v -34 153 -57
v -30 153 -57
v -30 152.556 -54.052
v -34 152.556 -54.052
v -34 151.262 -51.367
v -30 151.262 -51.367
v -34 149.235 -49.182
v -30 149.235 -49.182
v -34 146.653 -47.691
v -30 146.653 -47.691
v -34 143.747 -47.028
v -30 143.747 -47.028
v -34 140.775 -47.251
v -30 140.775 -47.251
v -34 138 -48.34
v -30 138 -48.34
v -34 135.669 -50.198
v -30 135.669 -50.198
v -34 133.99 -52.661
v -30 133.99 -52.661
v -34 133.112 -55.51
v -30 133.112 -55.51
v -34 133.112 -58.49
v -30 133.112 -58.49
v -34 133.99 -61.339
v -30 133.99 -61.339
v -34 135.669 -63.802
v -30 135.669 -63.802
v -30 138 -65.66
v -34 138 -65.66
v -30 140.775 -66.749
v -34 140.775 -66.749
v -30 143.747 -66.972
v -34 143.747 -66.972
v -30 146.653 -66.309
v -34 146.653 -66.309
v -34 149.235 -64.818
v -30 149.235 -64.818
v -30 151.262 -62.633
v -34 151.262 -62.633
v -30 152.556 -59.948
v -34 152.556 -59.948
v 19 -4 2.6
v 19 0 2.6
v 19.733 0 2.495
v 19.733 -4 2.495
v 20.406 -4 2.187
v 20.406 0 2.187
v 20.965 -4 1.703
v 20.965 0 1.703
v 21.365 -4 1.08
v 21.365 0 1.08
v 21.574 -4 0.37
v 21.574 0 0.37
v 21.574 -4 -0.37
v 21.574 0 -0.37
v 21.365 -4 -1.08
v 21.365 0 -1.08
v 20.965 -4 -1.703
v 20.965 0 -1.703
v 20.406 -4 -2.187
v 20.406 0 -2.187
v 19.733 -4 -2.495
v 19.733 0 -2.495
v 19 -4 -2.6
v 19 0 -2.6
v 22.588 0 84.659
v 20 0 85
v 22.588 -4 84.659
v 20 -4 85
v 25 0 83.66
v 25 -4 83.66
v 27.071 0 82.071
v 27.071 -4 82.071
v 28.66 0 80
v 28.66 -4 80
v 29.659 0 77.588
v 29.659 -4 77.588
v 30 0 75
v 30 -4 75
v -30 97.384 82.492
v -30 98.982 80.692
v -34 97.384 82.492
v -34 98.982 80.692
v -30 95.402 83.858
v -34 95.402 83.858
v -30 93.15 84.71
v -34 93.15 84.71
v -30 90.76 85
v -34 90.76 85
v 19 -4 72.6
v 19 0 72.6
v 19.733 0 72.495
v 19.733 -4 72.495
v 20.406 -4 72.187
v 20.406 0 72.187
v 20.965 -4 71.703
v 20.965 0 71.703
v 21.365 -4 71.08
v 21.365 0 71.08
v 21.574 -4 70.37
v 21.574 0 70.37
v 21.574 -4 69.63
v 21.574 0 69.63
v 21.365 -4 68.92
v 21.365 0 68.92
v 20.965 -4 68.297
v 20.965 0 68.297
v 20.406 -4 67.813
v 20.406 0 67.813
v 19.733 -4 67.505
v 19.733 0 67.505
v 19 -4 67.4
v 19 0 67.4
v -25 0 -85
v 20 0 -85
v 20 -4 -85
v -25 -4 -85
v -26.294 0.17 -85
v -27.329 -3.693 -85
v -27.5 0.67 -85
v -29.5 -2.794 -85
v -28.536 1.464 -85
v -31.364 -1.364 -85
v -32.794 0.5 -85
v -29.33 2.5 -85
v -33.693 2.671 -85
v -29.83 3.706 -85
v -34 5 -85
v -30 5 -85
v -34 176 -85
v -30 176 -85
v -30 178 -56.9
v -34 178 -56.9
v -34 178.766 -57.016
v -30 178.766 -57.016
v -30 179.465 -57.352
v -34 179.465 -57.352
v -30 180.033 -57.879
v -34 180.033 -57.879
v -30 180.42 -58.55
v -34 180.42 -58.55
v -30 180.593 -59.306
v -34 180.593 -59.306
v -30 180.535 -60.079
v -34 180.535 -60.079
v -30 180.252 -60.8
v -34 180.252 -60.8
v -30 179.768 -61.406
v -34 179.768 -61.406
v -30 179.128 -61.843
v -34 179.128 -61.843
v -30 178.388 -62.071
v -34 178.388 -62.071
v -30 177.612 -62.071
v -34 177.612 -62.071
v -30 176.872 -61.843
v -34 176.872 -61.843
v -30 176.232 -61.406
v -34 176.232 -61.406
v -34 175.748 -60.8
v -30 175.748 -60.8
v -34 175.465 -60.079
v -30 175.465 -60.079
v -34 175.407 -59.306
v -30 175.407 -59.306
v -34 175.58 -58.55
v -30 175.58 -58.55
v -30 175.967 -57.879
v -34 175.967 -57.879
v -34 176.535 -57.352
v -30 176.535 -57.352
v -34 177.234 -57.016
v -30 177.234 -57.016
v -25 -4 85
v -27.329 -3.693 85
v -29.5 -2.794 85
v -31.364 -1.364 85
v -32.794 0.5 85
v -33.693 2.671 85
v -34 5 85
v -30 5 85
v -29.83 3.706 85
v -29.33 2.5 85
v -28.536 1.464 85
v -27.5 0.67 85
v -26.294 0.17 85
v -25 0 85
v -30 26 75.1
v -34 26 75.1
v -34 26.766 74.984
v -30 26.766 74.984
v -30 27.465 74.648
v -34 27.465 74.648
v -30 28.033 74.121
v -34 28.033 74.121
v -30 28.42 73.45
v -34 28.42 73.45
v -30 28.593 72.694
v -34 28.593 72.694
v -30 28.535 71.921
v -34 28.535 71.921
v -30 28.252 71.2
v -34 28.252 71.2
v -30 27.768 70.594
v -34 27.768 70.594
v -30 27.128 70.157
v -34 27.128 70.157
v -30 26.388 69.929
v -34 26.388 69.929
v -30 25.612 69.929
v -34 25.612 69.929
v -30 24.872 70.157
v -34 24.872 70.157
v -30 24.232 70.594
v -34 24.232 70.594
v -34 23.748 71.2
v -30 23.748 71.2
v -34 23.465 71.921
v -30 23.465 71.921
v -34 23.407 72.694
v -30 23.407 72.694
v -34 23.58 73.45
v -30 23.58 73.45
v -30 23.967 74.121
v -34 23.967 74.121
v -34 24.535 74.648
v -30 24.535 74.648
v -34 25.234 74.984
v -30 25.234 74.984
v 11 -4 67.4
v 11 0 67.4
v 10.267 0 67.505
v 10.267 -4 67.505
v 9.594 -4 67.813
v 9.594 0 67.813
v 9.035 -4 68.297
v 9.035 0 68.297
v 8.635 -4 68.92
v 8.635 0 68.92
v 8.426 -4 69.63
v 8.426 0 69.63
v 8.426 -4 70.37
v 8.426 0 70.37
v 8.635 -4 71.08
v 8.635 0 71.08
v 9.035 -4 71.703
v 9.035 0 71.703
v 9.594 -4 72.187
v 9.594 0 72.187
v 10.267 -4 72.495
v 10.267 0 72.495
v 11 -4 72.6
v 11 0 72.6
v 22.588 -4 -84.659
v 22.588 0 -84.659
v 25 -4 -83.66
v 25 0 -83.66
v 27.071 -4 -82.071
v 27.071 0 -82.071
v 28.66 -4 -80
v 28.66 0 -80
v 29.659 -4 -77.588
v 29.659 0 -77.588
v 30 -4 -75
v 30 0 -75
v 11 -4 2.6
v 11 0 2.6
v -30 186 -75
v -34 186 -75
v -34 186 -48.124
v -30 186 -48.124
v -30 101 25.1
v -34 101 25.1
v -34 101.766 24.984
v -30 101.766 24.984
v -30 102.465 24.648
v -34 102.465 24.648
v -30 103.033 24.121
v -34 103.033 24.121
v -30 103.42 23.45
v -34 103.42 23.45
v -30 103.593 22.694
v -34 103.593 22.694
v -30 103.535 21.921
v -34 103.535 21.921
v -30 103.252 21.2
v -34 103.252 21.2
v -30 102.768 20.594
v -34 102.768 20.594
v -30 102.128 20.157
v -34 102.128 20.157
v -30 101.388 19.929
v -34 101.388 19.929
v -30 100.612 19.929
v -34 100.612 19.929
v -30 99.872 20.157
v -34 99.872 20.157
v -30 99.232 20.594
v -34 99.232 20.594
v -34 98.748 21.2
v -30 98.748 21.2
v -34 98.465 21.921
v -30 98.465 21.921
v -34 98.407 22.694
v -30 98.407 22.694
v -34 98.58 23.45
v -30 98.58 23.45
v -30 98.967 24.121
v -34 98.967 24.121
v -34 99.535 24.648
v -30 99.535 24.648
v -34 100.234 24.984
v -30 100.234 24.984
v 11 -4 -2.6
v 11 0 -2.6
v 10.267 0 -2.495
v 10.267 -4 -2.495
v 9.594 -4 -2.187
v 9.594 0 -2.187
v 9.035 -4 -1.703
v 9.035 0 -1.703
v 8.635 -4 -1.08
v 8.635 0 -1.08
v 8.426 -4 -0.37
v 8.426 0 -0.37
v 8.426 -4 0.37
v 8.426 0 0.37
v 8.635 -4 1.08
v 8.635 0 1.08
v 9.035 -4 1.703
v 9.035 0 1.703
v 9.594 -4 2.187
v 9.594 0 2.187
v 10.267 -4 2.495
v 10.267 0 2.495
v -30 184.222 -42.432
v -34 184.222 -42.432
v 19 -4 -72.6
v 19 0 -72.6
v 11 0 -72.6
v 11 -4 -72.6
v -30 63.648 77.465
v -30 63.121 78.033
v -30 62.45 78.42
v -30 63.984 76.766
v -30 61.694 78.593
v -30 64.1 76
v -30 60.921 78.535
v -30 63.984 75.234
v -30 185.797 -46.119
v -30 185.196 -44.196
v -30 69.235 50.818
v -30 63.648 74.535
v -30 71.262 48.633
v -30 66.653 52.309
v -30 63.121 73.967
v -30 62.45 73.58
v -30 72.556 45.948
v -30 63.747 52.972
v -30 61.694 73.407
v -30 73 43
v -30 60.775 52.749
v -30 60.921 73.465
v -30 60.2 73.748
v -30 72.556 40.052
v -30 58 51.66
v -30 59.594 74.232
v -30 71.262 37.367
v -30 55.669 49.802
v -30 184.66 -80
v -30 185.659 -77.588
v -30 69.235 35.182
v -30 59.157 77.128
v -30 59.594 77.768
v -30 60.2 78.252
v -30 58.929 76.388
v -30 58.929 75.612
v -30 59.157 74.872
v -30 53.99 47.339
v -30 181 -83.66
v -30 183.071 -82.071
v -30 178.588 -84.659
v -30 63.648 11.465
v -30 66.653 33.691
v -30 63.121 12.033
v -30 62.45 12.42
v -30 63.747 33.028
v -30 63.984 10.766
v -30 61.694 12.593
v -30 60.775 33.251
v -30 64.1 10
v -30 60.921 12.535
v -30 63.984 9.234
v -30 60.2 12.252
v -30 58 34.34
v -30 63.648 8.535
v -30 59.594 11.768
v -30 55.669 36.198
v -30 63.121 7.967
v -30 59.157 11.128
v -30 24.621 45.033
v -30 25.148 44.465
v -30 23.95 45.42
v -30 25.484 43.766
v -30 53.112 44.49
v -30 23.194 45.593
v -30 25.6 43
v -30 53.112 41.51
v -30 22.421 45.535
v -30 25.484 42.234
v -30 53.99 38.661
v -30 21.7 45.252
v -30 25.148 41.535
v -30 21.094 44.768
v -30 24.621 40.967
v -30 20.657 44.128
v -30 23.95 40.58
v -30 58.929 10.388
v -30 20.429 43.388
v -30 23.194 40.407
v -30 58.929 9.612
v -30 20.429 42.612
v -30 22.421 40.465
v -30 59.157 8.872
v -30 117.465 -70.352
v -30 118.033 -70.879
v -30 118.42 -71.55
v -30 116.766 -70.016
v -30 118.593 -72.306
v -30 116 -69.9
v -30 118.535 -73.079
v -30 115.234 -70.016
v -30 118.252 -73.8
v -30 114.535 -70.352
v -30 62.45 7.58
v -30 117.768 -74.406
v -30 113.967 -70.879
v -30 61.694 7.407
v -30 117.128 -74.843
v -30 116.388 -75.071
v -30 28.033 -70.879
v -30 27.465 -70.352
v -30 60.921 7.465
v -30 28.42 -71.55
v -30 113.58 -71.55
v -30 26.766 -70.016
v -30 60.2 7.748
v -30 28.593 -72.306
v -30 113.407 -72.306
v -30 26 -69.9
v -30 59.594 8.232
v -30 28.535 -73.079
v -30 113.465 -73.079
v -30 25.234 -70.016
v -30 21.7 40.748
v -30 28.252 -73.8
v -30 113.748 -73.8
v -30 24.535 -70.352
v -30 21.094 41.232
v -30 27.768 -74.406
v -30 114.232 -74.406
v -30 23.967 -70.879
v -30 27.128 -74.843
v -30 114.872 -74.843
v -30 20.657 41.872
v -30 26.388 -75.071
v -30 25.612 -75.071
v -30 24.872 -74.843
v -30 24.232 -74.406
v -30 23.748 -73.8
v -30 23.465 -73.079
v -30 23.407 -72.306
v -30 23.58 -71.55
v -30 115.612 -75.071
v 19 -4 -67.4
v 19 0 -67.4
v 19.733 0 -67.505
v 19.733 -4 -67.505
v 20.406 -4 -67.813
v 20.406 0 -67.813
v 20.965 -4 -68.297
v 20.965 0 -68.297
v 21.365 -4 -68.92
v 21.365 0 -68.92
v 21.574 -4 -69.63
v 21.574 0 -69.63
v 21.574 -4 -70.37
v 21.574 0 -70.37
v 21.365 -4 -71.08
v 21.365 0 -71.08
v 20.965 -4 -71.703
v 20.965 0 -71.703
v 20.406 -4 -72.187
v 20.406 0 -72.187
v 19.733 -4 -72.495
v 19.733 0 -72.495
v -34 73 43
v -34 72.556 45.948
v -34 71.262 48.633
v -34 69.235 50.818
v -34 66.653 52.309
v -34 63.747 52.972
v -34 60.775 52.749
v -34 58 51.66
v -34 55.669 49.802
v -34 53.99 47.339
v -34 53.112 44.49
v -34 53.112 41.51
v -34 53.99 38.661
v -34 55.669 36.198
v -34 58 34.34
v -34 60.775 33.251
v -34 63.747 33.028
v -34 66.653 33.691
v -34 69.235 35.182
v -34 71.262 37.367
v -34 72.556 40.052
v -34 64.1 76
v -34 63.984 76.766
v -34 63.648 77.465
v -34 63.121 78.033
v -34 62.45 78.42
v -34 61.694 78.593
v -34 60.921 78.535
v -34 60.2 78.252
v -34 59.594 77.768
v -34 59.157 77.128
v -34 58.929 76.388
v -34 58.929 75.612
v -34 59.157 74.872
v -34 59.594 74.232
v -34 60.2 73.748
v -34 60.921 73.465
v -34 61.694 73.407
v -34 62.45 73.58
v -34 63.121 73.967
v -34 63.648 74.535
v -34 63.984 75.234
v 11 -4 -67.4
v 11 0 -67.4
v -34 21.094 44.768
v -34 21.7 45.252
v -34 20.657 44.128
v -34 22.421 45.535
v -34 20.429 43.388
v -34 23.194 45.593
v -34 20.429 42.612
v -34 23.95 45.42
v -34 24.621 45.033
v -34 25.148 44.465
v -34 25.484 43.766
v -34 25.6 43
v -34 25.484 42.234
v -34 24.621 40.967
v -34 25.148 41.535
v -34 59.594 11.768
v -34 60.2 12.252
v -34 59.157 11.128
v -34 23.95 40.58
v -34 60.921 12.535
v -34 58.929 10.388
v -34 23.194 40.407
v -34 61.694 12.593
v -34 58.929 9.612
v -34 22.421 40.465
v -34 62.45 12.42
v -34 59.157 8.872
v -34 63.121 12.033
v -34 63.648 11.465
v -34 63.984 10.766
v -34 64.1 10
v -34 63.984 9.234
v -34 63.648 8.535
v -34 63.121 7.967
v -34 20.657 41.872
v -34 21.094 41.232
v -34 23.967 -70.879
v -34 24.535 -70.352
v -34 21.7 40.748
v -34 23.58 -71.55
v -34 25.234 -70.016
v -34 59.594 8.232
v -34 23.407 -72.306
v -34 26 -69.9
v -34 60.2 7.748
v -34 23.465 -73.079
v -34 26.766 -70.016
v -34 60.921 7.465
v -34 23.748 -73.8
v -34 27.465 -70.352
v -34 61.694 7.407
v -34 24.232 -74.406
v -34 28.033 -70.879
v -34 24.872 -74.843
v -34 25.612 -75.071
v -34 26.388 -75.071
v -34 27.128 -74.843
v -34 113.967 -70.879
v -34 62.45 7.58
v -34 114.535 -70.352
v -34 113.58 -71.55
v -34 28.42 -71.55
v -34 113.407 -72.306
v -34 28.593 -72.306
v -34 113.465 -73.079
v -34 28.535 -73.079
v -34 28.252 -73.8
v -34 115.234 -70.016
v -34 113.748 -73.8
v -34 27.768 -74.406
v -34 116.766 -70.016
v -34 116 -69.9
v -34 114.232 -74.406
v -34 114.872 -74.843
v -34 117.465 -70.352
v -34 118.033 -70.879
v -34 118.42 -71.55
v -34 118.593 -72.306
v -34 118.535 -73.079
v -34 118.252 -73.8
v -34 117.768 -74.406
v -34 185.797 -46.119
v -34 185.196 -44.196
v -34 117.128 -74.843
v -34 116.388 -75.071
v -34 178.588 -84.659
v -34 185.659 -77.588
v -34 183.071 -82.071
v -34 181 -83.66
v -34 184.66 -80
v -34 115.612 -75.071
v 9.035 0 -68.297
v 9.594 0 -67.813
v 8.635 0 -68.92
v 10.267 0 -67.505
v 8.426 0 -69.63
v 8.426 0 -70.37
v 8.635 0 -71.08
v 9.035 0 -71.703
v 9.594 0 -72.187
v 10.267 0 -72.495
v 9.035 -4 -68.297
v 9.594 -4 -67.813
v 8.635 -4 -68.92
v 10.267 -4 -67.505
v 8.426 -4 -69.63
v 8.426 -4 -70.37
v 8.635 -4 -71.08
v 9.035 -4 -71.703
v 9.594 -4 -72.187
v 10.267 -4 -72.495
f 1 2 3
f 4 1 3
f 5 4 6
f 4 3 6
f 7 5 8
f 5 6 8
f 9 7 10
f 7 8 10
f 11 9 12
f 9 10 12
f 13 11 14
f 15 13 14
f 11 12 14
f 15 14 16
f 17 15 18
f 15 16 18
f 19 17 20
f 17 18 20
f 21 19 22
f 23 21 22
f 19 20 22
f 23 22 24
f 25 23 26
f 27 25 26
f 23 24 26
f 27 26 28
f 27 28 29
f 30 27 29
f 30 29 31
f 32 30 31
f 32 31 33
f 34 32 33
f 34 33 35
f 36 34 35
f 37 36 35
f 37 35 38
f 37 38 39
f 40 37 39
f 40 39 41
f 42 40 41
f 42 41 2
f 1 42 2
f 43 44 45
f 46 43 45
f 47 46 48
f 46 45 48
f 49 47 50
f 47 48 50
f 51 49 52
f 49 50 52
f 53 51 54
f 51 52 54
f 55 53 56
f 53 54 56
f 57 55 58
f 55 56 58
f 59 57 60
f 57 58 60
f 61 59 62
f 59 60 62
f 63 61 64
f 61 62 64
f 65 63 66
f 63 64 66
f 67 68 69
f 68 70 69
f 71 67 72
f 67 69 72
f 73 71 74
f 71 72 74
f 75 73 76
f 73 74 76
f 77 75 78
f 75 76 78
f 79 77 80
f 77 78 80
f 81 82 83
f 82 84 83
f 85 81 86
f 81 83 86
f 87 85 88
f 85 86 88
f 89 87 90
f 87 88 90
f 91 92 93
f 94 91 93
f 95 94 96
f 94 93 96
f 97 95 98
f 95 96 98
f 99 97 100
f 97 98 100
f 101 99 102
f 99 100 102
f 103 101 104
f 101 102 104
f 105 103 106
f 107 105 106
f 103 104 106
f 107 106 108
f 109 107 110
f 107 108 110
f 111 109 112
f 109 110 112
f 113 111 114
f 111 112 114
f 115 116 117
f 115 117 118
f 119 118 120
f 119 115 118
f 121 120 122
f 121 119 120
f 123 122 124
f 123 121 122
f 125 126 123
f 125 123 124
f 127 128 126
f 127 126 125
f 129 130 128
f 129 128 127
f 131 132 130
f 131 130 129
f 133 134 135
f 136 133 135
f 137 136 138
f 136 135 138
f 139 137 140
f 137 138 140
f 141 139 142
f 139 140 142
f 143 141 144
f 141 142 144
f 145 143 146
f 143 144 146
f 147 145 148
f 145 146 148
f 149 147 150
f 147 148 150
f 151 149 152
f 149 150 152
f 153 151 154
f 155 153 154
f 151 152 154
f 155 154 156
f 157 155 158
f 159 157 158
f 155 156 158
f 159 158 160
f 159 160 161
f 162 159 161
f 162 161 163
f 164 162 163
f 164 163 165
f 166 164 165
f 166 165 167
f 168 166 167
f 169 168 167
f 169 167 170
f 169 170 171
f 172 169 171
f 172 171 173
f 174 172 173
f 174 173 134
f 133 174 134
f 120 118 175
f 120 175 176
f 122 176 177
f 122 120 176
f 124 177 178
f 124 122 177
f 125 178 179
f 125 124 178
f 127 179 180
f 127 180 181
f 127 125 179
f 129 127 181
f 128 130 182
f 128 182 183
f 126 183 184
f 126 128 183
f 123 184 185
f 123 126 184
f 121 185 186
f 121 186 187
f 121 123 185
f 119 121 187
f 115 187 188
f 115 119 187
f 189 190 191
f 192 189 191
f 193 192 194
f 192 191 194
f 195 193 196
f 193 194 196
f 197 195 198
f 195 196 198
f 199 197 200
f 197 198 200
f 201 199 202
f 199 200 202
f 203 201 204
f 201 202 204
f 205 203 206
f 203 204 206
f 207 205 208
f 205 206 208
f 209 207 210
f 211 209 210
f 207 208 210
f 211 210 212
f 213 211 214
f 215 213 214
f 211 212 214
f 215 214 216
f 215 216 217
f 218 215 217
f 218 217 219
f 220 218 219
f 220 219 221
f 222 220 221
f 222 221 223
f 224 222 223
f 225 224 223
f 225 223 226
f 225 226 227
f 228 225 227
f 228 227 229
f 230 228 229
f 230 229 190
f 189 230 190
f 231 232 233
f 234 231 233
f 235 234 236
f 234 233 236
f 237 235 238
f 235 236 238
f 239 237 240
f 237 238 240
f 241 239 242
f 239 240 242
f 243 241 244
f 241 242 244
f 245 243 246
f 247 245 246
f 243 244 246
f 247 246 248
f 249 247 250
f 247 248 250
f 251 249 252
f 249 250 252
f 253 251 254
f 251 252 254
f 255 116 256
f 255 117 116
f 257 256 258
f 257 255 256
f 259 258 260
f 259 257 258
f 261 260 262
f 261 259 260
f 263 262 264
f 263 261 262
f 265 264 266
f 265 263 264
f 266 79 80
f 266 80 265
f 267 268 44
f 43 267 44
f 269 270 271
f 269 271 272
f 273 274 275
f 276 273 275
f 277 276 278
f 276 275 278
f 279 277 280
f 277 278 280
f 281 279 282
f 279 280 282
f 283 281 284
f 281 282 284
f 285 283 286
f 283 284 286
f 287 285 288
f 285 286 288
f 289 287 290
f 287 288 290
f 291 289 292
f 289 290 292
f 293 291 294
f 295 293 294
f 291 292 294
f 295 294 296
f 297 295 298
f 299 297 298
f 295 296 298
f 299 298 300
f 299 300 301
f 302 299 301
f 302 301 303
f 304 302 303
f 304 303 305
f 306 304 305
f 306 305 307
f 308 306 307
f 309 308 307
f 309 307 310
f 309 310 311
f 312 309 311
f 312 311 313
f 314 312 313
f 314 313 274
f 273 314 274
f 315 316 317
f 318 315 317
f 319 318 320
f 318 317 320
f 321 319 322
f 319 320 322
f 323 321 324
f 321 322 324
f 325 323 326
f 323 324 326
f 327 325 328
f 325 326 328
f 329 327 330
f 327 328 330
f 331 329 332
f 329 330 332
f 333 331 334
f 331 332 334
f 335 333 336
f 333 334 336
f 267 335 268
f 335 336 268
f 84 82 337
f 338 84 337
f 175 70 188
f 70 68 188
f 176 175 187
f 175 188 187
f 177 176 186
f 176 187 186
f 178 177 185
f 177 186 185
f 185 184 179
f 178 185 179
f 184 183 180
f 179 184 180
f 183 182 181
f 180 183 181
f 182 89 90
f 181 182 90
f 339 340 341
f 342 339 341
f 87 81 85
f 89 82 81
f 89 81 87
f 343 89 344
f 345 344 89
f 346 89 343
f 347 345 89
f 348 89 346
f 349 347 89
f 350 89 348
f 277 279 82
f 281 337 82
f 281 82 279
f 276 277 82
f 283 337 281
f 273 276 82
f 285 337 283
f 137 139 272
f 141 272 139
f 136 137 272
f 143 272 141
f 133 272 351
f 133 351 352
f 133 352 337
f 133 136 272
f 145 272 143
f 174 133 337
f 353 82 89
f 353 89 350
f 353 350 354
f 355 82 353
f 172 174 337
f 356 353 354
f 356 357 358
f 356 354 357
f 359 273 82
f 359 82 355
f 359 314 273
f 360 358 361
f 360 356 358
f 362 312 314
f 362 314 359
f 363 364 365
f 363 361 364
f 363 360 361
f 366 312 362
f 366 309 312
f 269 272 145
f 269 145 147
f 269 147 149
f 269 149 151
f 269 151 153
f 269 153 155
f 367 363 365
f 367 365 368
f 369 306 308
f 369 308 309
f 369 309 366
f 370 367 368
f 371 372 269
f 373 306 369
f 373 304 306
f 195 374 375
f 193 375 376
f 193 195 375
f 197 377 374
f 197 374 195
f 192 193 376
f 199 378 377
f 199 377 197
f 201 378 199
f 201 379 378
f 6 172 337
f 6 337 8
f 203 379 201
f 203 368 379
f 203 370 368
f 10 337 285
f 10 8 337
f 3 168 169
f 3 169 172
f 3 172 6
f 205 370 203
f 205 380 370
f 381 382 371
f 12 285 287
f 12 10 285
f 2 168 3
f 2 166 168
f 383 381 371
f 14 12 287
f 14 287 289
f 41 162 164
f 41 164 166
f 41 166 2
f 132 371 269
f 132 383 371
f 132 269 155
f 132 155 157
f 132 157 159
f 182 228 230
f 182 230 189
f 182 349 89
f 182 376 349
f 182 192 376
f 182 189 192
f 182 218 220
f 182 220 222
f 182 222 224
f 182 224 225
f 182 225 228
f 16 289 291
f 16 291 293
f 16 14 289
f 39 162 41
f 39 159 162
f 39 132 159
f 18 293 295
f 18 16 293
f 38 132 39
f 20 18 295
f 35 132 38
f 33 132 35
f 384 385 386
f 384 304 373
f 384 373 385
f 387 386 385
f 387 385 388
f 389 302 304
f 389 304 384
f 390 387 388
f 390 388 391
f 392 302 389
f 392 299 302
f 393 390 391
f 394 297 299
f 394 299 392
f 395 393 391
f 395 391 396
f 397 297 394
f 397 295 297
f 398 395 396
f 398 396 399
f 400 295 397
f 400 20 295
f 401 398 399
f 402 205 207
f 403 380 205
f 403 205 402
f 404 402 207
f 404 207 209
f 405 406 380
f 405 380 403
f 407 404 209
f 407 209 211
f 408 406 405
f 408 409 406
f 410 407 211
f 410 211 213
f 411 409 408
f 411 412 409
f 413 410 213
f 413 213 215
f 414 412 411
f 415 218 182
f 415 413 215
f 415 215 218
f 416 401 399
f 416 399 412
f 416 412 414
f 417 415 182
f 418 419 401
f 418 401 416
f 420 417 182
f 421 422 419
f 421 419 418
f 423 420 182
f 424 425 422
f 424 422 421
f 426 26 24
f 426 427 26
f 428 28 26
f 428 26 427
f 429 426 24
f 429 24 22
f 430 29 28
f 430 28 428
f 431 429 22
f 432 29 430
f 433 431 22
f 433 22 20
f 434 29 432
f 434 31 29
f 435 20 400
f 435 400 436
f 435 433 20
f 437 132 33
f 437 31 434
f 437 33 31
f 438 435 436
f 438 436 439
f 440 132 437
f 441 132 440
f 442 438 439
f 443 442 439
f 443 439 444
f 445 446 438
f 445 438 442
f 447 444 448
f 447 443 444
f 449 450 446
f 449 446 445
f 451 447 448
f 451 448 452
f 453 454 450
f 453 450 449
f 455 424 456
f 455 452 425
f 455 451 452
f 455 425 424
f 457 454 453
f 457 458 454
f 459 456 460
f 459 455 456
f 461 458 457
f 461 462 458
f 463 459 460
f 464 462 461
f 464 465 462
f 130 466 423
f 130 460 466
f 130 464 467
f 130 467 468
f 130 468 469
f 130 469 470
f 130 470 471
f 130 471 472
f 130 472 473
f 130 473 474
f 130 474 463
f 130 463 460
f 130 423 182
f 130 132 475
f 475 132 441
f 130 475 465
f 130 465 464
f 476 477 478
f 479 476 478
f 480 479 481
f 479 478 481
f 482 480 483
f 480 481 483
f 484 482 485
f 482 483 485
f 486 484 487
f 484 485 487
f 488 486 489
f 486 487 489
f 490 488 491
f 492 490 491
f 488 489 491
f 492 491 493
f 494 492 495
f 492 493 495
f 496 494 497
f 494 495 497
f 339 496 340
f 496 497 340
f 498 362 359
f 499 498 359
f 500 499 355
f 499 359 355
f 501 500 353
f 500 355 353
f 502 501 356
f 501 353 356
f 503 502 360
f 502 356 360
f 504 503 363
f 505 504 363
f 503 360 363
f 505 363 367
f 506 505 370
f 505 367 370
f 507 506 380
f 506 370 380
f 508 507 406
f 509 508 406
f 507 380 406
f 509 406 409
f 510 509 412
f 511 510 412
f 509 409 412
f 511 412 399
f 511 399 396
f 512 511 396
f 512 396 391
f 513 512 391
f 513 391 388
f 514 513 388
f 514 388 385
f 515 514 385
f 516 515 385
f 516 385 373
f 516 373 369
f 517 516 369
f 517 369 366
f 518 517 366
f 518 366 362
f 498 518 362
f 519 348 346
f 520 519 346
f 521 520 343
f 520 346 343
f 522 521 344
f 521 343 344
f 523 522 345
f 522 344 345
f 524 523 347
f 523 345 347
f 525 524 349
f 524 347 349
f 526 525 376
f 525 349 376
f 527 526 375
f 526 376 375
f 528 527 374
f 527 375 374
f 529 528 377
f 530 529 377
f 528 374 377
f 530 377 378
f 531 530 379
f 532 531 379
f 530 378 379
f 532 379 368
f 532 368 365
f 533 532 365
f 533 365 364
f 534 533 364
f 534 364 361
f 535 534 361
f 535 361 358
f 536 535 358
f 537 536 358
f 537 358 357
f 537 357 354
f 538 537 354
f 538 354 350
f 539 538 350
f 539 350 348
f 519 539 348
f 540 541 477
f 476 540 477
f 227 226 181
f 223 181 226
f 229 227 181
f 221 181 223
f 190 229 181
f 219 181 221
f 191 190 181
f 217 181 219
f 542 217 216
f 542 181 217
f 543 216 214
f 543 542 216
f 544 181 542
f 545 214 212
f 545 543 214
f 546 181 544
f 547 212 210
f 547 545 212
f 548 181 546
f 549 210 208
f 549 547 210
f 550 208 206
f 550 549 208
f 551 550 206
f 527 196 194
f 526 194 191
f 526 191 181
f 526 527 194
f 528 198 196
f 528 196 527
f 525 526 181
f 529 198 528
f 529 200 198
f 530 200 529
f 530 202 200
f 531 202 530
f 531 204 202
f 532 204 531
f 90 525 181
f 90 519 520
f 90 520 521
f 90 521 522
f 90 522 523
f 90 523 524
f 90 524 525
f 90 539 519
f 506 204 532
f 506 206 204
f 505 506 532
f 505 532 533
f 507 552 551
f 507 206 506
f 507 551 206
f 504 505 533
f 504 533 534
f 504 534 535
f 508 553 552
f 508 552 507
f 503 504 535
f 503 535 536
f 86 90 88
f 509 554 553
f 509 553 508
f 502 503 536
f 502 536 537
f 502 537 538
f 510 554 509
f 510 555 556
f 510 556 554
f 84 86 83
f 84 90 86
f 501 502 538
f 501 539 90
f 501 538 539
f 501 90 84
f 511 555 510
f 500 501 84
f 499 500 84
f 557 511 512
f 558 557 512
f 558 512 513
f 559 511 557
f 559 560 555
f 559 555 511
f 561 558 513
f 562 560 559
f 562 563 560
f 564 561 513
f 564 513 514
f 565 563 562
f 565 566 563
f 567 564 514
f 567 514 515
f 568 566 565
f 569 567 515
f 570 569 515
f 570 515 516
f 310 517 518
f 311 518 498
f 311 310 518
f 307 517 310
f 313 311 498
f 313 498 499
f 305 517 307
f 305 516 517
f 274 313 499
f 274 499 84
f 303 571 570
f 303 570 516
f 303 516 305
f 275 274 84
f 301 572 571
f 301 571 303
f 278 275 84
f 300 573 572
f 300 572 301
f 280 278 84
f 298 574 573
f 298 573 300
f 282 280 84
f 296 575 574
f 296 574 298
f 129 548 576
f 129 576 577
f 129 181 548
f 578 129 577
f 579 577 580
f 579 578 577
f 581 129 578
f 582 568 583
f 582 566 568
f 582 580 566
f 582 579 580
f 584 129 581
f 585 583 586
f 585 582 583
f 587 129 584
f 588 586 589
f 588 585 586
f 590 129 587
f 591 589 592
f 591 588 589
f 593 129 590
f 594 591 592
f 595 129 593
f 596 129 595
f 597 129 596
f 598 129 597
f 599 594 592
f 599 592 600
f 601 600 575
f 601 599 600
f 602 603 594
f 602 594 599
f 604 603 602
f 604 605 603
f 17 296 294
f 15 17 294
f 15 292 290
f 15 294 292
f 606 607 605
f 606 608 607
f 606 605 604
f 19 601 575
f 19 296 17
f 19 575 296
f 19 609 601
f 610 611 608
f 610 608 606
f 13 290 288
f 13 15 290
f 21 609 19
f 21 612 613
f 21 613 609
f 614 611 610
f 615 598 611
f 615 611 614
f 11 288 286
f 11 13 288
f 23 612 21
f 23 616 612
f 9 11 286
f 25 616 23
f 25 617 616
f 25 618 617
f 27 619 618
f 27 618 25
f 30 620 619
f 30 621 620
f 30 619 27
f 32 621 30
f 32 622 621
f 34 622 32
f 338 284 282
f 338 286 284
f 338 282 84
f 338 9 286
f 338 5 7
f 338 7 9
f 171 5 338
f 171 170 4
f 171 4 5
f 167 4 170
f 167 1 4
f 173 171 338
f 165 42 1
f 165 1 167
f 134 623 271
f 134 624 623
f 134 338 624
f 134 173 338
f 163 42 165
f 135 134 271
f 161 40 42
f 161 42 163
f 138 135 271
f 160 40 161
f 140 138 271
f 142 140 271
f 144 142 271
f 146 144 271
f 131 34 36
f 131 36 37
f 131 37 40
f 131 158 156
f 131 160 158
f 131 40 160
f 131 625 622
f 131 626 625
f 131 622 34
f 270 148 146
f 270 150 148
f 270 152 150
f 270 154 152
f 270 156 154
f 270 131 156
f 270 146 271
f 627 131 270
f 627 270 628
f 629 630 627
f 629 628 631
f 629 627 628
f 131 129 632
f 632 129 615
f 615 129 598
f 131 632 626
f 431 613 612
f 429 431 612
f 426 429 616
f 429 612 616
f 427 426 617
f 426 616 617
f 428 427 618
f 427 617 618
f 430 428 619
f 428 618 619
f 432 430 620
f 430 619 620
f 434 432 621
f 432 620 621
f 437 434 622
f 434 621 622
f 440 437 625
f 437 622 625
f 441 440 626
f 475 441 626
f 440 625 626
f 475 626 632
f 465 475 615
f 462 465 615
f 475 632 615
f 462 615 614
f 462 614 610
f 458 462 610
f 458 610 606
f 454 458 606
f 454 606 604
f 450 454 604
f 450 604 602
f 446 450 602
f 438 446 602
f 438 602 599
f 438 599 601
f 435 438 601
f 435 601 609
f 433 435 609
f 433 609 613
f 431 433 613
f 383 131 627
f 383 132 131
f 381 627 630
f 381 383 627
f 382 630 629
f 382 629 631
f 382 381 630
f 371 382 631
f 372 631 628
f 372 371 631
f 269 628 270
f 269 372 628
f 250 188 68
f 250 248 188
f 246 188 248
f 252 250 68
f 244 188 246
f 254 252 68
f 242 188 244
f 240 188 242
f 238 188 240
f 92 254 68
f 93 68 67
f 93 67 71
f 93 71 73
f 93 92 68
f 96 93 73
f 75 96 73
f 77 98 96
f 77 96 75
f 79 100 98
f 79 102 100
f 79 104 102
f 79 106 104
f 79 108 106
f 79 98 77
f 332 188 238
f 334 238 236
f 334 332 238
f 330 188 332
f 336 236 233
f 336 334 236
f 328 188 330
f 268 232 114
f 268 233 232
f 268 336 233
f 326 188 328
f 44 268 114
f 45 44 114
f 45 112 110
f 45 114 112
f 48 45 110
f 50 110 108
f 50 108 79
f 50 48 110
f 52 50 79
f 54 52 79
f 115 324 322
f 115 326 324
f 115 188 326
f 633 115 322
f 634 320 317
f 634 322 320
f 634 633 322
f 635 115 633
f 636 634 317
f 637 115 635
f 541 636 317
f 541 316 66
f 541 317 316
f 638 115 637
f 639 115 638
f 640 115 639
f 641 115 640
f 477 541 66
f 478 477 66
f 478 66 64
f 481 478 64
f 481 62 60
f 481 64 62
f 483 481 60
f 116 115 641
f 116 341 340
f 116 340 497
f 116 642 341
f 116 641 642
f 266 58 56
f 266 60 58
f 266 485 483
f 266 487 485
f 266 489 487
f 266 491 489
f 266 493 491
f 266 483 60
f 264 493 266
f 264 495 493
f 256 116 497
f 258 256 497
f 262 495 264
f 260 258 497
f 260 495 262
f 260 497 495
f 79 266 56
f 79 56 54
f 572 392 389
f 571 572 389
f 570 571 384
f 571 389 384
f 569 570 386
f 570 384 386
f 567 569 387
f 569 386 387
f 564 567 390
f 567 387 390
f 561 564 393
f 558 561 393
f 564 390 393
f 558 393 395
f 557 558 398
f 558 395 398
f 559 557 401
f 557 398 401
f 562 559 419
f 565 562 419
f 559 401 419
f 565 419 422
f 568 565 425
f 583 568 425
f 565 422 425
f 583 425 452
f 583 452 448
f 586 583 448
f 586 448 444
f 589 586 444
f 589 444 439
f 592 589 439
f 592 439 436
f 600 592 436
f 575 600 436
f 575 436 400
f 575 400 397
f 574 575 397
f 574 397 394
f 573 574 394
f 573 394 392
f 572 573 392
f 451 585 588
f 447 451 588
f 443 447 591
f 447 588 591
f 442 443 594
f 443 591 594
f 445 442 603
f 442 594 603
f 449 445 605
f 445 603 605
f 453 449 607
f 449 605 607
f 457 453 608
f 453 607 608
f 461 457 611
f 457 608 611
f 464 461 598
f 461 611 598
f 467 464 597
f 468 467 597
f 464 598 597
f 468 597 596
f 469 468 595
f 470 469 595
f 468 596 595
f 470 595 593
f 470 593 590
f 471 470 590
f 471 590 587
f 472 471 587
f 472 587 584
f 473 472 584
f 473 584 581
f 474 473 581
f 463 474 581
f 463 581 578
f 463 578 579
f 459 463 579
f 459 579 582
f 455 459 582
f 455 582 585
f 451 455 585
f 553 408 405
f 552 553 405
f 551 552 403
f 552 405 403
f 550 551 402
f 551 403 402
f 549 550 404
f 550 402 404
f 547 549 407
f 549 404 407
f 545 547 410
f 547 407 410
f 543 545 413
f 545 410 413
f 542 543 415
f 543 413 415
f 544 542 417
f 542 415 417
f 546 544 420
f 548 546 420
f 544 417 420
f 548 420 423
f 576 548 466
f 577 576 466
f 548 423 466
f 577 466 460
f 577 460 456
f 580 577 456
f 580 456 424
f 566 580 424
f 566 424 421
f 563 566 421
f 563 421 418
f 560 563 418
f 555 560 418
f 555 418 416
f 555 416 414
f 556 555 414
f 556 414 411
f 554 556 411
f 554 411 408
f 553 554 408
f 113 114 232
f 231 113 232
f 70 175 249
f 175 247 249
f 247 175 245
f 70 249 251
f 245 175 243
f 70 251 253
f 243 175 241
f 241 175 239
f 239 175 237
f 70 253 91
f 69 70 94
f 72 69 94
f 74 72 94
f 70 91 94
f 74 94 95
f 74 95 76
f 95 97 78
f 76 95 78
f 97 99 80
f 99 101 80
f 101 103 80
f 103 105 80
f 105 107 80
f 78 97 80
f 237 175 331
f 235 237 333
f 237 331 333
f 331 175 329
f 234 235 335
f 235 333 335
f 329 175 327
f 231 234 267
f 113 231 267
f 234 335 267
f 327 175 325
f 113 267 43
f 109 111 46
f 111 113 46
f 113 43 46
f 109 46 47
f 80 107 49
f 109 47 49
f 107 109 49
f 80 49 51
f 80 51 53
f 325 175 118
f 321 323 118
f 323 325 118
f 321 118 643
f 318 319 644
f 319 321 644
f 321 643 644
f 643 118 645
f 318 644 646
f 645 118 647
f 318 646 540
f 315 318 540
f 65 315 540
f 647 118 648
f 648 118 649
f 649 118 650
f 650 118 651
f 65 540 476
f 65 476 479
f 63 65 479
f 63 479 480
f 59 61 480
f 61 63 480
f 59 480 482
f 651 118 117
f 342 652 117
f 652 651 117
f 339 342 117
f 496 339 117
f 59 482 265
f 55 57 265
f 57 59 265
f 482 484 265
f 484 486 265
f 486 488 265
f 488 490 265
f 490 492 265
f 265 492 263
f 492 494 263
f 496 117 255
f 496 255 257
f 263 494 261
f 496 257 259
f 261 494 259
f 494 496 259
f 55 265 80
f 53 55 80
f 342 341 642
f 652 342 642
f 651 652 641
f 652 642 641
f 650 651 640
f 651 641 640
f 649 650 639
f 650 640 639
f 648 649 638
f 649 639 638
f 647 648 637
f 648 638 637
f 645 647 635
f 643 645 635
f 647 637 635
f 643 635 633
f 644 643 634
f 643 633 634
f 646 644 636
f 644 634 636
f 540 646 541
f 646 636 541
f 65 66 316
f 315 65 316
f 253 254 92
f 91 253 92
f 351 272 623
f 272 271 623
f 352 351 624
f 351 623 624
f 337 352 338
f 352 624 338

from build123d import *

# Parameters (mm, degrees)
SKETCH1_W                    = 60
SKETCH1_H                    = 170
BASE_FLANGE1_DEPTH           = 4
EDGE_FLANGE1_STRIP_W         = 26
EDGE_FLANGE1_STRIP_H         = 4
EDGE_FLANGE1_STRIP_CUT_DEPTH = 170
EDGE_FLANGE1_DEPTH           = 170
SKETCH15_R                   = 10
CUT_EXTRUDE4_DEPTH           = 10
CUT_EXTRUDE5_DEPTH           = 10
FILLET1_R                    = 10
F_1_0MM_DOWEL_HOLE2_D        = 5.2
F_1_0MM_DOWEL_HOLE2_DEPTH    = 12.03
F_1_0MM_DOWEL_HOLE2_TIP      = 1.562237609
SKETCH33_R                   = 2.6
CUT_EXTRUDE6_DEPTH           = 7
F_1_0MM_DOWEL_HOLE3_D        = 5.2
F_1_0MM_DOWEL_HOLE3_DEPTH    = 12.03
F_1_0MM_DOWEL_HOLE3_TIP      = 1.562237609
CUT_EXTRUDE7_DEPTH           = 10


# Sheet-metal steps are written as plain solids
with BuildPart() as part:
    # Sketch1 → Base-Flange1 (new body)
    with BuildSketch(Plane(origin=(0, 0, 0), x_dir=(1, 0, 0), z_dir=(0, 1, 0))):
        Rectangle(SKETCH1_W, SKETCH1_H)
    extrude(amount=-BASE_FLANGE1_DEPTH)

    # Edge-Flange1 strip (across the edge) → Edge-Flange1 strip cut (cut)
    with BuildSketch(Plane(origin=(-30, 0, -85), x_dir=(1, 0, 0), z_dir=(0, 0, 1))):
        with Locations((-8, -2)):
            Rectangle(EDGE_FLANGE1_STRIP_W, EDGE_FLANGE1_STRIP_H)
    extrude(amount=EDGE_FLANGE1_STRIP_CUT_DEPTH, mode=Mode.SUBTRACT)

    # Edge-Flange1 section (across the edge) → Edge-Flange1 (add)
    with BuildSketch(Plane(origin=(-30, 0, -85), x_dir=(1, 0, 0), z_dir=(0, 0, 1))):
        with BuildLine():
            Line((-4, 5), (-4, 186))
            Line((-4, 186), (0, 186))
            Line((0, 186), (0, 5))
            ThreePointArc((0, 5), (1.464466094, 1.464466094), (5, 0))
            Line((5, 0), (5, -4))
            ThreePointArc((5, -4), (-1.363961031, -1.363961031), (-4, 5))
        make_face()
    extrude(amount=EDGE_FLANGE1_DEPTH)

    # Sketch15 → Cut-Extrude4 (cut)
    with BuildSketch(Plane(origin=(-30, 0, 0), x_dir=(0, 0, -1), z_dir=(1, 0, 0))):
        with Locations(Location((-43, 63, 0), (0, 0, 90))):
            Circle(SKETCH15_R)
        with Locations(Location((57, 143, 0), (0, 0, 90))):
            Circle(SKETCH15_R)
    extrude(amount=-CUT_EXTRUDE4_DEPTH, mode=Mode.SUBTRACT)

    # Sketch16 → Cut-Extrude5 (cut)
    with BuildSketch(Plane(origin=(-30, 0, 0), x_dir=(0, 0, -1), z_dir=(1, 0, 0))):
        Polygon((-85, 96), (45, 186), (-85, 186), align=None)
    extrude(amount=-CUT_EXTRUDE5_DEPTH, mode=Mode.SUBTRACT)

    # Fillet1
    fillet1_edges = [part.edges().sort_by_distance(p)[0] for p in [
        (-32, 186, -85),
        (-32, 186, -45),
        (-32, 96, 85),
        (30, -2, 85),
        (30, -2, -85),
    ]]
    fillet(fillet1_edges, radius=FILLET1_R)

    # Ø1.0mm Dowel Hole2
    with Locations(Plane(origin=(-30, 0, 0), x_dir=(0, 0, -1), z_dir=(1, 0, 0))):
        with Locations((-72.5, 26), (72.5, 26), (72.5, 116), (-22.5, 101), (59.5, 178)):
            Hole(F_1_0MM_DOWEL_HOLE2_D / 2, depth=F_1_0MM_DOWEL_HOLE2_DEPTH)
            with Locations((0, 0, -(F_1_0MM_DOWEL_HOLE2_DEPTH + F_1_0MM_DOWEL_HOLE2_TIP / 2))):  # 118° drill point
                Cone(0, F_1_0MM_DOWEL_HOLE2_D / 2, F_1_0MM_DOWEL_HOLE2_TIP, mode=Mode.SUBTRACT)

    # Sketch33 → Cut-Extrude6 (cut)
    with BuildSketch(Plane(origin=(-30, 0, 0), x_dir=(0, 0, -1), z_dir=(1, 0, 0))):
        with Locations(Location((-10, 61.5, 0), (0, 0, 90))):
            Circle(SKETCH33_R)
        with Locations(Location((-76, 61.5, 0), (0, 0, 90))):
            Circle(SKETCH33_R)
        with Locations(Location((-43, 23, 0), (0, 0, 90))):
            Circle(SKETCH33_R)
    extrude(amount=-CUT_EXTRUDE6_DEPTH, mode=Mode.SUBTRACT)

    # Ø1.0mm Dowel Hole3
    with Locations(Plane(origin=(0, 0, 0), x_dir=(1, 0, 0), z_dir=(0, 1, 0))):
        with Locations((15, 70), (15, 0), (15, -70)):
            Hole(F_1_0MM_DOWEL_HOLE3_D / 2, depth=F_1_0MM_DOWEL_HOLE3_DEPTH)
            with Locations((0, 0, -(F_1_0MM_DOWEL_HOLE3_DEPTH + F_1_0MM_DOWEL_HOLE3_TIP / 2))):  # 118° drill point
                Cone(0, F_1_0MM_DOWEL_HOLE3_D / 2, F_1_0MM_DOWEL_HOLE3_TIP, mode=Mode.SUBTRACT)

    # Sketch36 → Cut-Extrude7 (cut)
    with BuildSketch(Plane(origin=(0, 0, 0), x_dir=(1, 0, 0), z_dir=(0, 1, 0))):
        with BuildLine():
            Line((11, 67.4), (19, 67.4))
            ThreePointArc((19, 67.4), (21.6, 70), (19, 72.6))
            Line((19, 72.6), (11, 72.6))
            ThreePointArc((11, 72.6), (8.4, 70), (11, 67.4))
        make_face()
        with BuildLine():
            Line((11, -2.6), (19, -2.6))
            ThreePointArc((19, -2.6), (21.6, 0), (19, 2.6))
            Line((19, 2.6), (11, 2.6))
            ThreePointArc((11, 2.6), (8.4, 0), (11, -2.6))
        make_face()
        with BuildLine():
            Line((11, -72.6), (19, -72.6))
            ThreePointArc((19, -72.6), (21.6, -70), (19, -67.4))
            Line((19, -67.4), (11, -67.4))
            ThreePointArc((11, -67.4), (8.4, -70), (11, -72.6))
        make_face()
    extrude(amount=-CUT_EXTRUDE7_DEPTH, mode=Mode.SUBTRACT)


solid = part.part
